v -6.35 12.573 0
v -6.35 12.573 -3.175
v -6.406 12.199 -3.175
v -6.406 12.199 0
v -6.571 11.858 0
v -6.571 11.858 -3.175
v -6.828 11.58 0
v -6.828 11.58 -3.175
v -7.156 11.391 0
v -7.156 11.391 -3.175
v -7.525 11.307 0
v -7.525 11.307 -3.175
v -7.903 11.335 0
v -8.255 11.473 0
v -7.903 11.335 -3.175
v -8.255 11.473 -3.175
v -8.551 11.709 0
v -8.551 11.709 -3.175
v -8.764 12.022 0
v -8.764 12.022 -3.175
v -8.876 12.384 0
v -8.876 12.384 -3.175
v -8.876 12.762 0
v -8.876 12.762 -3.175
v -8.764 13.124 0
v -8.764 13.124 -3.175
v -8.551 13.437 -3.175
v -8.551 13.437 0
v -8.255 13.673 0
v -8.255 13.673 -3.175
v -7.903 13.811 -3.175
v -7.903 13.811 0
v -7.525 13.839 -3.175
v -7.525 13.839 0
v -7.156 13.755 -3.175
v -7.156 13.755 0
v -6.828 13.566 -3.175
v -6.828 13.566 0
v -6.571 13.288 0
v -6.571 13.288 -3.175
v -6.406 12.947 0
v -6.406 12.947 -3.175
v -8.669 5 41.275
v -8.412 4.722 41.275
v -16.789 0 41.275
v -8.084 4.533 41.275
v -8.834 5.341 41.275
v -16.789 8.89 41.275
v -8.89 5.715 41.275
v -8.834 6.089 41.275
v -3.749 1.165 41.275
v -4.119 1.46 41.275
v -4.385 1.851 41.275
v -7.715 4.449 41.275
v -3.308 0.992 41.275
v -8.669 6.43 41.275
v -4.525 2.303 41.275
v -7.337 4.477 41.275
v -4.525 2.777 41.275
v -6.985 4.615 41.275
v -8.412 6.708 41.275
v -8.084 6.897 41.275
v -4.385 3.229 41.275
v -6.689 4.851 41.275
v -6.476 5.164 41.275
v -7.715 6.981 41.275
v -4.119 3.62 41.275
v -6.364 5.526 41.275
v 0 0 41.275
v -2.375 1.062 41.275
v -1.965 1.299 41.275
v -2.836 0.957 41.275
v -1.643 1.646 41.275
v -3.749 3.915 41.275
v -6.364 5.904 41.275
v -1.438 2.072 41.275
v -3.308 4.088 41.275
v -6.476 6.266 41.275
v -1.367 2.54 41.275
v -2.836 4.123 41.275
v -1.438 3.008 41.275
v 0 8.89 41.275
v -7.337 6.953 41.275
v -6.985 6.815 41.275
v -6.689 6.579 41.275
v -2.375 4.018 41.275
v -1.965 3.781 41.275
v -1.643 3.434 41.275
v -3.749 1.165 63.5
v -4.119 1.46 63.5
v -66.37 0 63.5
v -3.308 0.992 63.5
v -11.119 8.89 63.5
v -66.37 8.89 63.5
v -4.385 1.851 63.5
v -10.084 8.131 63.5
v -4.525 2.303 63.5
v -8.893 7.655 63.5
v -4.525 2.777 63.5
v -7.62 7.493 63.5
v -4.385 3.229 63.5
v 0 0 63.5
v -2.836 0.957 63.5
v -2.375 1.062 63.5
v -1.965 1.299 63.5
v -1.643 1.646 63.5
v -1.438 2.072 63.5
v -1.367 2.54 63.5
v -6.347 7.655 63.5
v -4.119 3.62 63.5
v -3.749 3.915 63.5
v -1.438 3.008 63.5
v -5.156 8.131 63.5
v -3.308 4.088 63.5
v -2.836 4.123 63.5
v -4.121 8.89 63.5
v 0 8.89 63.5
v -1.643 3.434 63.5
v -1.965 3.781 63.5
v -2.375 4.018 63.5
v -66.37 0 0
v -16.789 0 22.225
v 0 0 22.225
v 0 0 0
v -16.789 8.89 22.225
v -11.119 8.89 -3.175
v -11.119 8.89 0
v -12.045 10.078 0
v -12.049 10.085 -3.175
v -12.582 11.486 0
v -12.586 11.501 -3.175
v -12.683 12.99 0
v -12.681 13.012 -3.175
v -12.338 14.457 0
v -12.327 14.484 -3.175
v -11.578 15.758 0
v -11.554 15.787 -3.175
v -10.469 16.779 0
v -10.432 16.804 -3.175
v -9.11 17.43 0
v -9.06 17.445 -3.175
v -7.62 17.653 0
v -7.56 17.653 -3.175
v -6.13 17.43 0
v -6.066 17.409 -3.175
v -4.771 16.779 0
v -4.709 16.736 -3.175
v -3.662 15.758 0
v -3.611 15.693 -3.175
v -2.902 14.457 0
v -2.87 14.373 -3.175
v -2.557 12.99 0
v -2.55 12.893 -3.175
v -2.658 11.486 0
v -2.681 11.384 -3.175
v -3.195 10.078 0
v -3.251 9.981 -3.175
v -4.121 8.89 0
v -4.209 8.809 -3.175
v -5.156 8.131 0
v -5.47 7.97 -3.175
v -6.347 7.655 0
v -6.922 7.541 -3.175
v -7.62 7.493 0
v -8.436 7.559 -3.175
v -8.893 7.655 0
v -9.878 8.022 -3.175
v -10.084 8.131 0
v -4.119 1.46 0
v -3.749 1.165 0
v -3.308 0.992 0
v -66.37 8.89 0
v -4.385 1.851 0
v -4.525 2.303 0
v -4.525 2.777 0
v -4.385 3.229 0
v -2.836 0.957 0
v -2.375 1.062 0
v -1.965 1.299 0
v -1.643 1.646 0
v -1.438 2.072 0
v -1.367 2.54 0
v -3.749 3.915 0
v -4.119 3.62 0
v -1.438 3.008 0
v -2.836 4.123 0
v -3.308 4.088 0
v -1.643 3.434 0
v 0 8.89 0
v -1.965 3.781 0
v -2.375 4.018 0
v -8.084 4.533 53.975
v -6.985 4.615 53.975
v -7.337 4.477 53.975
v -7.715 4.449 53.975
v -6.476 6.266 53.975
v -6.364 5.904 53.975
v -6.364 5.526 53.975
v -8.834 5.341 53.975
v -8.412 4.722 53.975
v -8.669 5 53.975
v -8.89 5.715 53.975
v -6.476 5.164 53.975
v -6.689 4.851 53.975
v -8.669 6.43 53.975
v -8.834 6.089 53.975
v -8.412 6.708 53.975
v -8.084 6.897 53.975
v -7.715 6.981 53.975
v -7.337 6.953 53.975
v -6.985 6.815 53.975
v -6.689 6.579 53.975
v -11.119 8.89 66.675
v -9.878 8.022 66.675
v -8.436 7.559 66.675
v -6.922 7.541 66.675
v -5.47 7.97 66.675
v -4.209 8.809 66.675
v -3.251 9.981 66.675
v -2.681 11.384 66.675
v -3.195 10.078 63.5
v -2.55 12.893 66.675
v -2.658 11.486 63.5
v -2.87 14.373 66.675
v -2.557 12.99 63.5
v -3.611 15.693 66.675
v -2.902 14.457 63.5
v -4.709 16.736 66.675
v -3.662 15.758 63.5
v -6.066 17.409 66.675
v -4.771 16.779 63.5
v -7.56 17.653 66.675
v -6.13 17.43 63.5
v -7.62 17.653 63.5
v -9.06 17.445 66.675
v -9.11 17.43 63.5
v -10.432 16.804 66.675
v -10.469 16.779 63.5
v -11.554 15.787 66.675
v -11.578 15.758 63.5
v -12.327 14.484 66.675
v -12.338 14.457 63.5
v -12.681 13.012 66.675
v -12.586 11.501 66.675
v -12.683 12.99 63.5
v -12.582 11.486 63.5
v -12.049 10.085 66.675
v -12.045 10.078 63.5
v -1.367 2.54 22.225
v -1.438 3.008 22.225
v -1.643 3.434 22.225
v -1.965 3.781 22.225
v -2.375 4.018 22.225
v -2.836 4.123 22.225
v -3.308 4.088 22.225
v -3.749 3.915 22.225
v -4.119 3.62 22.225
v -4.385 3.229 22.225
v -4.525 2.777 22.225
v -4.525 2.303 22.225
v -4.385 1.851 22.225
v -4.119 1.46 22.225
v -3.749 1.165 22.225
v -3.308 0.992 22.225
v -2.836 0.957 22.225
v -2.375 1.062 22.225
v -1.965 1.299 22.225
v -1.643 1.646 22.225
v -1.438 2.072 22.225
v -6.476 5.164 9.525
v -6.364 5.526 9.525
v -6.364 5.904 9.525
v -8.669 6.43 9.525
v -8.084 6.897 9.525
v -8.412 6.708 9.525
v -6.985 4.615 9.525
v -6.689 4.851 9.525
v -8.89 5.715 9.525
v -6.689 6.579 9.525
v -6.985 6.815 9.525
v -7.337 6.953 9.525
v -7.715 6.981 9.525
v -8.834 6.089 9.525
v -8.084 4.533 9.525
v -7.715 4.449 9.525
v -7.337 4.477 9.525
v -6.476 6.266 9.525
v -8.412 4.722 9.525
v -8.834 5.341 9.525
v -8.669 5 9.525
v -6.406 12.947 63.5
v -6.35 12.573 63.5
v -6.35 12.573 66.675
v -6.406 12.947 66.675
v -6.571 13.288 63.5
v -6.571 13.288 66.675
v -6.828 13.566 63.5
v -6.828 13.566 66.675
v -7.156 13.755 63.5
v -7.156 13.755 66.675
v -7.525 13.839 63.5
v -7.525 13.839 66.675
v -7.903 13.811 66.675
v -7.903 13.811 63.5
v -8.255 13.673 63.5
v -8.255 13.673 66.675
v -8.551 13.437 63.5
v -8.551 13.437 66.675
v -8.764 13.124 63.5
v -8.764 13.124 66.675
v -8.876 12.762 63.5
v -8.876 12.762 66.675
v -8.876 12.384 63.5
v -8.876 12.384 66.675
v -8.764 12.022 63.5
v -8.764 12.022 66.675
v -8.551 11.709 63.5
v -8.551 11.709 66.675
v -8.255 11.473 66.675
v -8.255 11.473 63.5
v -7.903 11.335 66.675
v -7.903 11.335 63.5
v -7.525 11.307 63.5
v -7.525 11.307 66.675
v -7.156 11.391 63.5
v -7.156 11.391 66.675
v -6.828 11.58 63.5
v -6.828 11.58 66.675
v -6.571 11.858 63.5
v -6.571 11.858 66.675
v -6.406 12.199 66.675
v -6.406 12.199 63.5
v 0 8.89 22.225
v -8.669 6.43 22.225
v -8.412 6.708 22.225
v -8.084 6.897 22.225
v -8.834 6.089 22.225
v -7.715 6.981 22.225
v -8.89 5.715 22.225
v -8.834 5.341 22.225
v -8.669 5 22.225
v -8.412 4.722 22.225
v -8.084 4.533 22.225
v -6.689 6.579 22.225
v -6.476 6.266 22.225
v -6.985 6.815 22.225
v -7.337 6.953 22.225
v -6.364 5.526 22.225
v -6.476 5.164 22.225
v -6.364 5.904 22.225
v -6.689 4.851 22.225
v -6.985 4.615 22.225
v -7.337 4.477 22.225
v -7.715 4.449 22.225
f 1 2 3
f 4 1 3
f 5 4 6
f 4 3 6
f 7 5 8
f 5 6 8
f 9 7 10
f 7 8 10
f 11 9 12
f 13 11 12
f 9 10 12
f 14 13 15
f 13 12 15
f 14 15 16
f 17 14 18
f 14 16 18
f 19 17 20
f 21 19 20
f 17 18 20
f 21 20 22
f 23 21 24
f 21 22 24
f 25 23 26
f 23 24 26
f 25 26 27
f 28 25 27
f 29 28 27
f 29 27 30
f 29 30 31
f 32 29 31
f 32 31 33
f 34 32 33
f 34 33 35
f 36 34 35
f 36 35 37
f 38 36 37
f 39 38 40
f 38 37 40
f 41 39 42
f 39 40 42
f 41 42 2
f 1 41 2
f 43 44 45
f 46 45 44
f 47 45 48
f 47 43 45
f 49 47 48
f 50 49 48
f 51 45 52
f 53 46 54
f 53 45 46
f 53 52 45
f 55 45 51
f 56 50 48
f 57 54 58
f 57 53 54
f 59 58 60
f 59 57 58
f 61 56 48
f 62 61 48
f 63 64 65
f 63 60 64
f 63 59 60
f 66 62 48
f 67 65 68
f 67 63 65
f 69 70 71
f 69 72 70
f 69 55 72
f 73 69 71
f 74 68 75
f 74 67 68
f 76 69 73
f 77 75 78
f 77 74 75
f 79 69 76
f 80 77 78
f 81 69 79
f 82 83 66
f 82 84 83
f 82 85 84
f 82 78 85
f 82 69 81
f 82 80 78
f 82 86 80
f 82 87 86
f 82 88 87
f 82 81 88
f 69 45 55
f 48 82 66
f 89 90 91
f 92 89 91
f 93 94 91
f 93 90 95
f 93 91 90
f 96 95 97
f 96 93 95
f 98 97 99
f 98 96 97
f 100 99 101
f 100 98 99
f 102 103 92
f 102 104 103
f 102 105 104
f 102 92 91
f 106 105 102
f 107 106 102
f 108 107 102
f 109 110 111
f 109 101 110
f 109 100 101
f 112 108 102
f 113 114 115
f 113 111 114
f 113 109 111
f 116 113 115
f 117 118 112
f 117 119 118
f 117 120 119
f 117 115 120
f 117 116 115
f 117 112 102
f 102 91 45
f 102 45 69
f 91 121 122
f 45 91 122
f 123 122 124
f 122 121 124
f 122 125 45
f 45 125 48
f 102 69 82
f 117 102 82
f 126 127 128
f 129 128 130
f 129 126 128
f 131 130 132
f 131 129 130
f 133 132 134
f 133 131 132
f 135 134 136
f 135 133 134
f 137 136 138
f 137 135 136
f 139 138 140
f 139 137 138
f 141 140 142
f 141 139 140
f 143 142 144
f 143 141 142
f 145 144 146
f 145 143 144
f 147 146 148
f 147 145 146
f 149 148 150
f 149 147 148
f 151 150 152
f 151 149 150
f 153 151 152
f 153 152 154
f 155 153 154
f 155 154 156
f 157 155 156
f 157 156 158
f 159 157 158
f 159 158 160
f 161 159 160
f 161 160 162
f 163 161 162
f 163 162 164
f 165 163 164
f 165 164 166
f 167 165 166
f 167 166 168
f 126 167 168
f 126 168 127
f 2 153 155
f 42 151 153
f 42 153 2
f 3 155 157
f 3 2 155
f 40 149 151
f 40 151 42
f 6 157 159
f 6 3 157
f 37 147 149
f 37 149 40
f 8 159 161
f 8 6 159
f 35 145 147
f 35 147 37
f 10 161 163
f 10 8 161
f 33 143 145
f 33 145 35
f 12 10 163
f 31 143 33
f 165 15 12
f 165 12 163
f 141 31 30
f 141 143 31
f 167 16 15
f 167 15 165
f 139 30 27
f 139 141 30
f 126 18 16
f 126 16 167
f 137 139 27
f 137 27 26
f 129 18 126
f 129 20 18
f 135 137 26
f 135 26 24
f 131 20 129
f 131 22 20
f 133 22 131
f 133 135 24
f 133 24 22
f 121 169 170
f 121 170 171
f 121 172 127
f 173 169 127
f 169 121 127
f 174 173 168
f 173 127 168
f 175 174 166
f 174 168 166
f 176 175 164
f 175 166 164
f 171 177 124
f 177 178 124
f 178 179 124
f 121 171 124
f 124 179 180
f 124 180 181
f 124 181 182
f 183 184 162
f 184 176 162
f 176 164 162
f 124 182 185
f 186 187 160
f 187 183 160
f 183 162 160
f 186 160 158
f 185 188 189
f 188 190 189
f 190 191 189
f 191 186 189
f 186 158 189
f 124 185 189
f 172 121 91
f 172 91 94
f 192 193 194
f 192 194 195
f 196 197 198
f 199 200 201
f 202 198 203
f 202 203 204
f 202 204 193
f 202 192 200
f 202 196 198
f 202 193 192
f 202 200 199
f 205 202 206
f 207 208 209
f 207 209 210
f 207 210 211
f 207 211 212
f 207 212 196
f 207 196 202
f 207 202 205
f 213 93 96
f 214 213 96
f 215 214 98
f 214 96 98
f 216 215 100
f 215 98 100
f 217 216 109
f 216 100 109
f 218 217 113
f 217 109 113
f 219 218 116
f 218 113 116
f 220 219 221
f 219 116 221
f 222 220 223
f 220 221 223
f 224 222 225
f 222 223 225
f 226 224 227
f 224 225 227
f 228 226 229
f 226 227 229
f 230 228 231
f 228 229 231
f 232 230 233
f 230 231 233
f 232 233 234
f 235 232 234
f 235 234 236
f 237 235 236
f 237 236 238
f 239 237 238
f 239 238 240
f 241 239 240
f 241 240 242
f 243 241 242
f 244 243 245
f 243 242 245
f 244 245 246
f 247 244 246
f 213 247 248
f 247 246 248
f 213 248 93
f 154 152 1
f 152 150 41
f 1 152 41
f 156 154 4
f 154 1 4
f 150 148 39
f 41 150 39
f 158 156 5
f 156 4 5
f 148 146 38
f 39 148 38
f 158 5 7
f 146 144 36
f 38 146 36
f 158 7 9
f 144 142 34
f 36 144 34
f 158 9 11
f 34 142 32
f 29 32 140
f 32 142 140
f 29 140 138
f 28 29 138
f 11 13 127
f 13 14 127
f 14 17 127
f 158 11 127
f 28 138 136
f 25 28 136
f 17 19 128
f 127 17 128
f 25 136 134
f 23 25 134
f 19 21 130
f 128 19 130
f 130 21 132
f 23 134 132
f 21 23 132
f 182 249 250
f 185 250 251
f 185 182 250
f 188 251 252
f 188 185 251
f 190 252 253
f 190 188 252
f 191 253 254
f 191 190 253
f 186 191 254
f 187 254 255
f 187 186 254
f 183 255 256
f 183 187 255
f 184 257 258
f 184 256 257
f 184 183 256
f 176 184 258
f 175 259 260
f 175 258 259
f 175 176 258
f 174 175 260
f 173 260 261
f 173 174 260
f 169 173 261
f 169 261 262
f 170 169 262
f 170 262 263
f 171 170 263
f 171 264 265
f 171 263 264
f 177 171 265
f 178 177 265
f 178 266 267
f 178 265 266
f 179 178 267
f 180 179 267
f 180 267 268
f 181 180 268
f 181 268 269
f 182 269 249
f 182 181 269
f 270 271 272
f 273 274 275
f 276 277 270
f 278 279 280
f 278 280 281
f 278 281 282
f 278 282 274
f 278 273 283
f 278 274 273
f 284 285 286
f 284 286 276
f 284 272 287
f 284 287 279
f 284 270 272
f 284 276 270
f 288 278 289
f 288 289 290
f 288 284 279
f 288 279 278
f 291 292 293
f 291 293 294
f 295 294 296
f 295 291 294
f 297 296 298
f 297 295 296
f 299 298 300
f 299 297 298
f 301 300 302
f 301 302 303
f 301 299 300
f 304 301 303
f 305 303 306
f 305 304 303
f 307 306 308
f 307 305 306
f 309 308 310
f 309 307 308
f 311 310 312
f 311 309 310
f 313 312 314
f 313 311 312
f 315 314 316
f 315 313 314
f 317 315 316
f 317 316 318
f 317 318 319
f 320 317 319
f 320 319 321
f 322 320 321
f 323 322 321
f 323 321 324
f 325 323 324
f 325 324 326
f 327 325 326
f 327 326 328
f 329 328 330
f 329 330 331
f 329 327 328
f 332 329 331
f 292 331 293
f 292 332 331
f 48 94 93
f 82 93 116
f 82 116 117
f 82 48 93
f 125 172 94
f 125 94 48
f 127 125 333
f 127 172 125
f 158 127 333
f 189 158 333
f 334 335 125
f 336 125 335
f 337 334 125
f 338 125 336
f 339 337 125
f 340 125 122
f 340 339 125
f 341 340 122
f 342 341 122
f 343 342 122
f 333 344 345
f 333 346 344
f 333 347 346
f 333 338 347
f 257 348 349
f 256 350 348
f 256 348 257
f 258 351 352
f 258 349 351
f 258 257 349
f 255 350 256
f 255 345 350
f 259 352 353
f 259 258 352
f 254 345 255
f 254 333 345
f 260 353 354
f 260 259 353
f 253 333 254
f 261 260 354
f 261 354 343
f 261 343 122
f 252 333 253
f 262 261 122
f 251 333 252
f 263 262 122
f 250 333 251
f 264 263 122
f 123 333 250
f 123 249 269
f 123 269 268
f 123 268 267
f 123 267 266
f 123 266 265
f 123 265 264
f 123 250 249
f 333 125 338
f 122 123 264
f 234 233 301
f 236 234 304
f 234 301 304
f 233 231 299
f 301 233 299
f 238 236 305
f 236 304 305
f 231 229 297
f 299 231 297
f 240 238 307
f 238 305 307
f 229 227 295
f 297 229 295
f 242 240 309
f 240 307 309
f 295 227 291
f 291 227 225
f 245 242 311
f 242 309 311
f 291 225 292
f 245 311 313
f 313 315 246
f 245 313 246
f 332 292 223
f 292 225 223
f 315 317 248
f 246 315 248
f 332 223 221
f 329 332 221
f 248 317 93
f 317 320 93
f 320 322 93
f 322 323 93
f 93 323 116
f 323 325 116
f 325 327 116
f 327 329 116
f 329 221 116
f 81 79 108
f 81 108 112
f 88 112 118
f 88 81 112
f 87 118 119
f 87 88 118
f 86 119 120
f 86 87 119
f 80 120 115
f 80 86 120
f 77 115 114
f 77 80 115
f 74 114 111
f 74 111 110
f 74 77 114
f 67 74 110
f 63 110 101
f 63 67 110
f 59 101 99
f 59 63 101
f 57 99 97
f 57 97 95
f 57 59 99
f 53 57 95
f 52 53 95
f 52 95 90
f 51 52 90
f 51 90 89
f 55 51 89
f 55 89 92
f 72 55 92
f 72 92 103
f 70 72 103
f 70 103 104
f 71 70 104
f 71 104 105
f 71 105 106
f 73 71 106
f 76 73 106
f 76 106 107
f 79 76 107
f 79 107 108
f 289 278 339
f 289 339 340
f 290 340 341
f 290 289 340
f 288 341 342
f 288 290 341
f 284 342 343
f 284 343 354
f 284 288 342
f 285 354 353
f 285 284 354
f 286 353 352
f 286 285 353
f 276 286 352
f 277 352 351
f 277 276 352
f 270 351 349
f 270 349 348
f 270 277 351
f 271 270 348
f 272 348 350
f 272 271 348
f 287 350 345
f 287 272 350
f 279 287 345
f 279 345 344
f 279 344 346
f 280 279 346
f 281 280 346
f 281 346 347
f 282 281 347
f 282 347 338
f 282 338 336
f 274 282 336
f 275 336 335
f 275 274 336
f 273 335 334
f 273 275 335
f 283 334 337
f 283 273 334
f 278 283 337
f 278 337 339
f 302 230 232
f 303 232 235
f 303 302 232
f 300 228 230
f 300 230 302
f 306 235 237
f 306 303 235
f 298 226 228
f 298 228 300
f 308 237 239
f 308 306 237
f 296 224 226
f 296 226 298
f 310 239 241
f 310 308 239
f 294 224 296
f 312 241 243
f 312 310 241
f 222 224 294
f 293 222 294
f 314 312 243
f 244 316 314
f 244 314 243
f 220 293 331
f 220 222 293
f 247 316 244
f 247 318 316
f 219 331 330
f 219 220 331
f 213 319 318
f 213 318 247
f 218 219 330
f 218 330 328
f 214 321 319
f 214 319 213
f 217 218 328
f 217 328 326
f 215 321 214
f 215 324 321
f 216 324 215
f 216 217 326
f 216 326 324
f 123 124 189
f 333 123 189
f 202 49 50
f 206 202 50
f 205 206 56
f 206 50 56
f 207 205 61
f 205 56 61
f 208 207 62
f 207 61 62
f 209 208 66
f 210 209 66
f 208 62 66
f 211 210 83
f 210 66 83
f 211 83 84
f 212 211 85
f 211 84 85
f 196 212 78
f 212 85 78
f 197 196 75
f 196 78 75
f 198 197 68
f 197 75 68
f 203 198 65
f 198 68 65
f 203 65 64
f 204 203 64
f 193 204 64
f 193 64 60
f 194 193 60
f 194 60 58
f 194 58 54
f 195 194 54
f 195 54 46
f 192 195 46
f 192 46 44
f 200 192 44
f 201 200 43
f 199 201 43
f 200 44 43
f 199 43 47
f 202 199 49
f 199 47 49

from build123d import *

# Parameters (mm, degrees)
SKETCH1_W           = 66.3702
SKETCH1_H           = 8.89
SKETCH1_R           = 1.5875
BOSS_EXTRUDE2_DEPTH = 63.5
CUT_EXTRUDE1_DEPTH  = 16.7894
SKETCH3_R           = 1.27
CUT_EXTRUDE2_DEPTH  = 12.7
CUT_EXTRUDE3_START  = -12.7
SKETCH4_R           = 1.27
CUT_EXTRUDE3_DEPTH  = 12.7
SKETCH5_R           = 5.08
SKETCH5_R_2         = 1.27
BOSS_EXTRUDE3_DEPTH = 3.175
BOSS_EXTRUDE4_START = 3.175
SKETCH6_R           = 5.08
SKETCH6_R_2         = 1.27
BOSS_EXTRUDE4_DEPTH = 3.175


with BuildPart() as part:
    # Sketch1 → Boss-Extrude2 (new body)
    with BuildSketch(Plane.XY):
        with Locations((-33.1851, 4.445)):
            Rectangle(SKETCH1_W, SKETCH1_H)
        with Locations((-2.954856457, 2.54)):
            Circle(SKETCH1_R, mode=Mode.SUBTRACT)
    extrude(amount=BOSS_EXTRUDE2_DEPTH)

    # Sketch2 → Cut-Extrude1 (cut)
    with BuildSketch(Plane(origin=(0, 0, 0), x_dir=(0, 0, -1), z_dir=(1, 0, 0))):
        Polygon((-31.75, 8.89), (-22.225, 8.89), (-22.225, 0), (-41.275, 0), (-41.275, 8.89), align=None)
    extrude(amount=-CUT_EXTRUDE1_DEPTH, mode=Mode.SUBTRACT)

    # Sketch3 → Cut-Extrude2 (cut)
    with BuildSketch(Plane(origin=(0, 0, 41.275), x_dir=(-1, 0, 0), z_dir=(0, 0, -1))):
        with Locations((7.62, 5.715)):
            Circle(SKETCH3_R)
    extrude(amount=-CUT_EXTRUDE2_DEPTH, mode=Mode.SUBTRACT)

    # Sketch4 → Cut-Extrude3 (cut)
    with BuildSketch(Plane.XY.offset(22.225).offset(CUT_EXTRUDE3_START)):
        with Locations(Location((-7.62, 5.715, 0), (0, 0, 180))):
            Circle(SKETCH4_R)
    extrude(amount=CUT_EXTRUDE3_DEPTH, mode=Mode.SUBTRACT)

    # Sketch5 → Boss-Extrude3 (add)
    with BuildSketch(Plane.XY.offset(63.5)):
        with Locations(Location((-7.62, 12.573, 0), (0, 0, 226.468847833))):
            Circle(SKETCH5_R)
        with Locations((-7.62, 12.573)):
            Circle(SKETCH5_R_2, mode=Mode.SUBTRACT)
    extrude(amount=BOSS_EXTRUDE3_DEPTH)

    # Sketch6 → Boss-Extrude4 (add)
    with BuildSketch(Plane(origin=(0, 0, 0), x_dir=(-1, 0, 0), z_dir=(0, 0, -1)).offset(BOSS_EXTRUDE4_START)):
        with Locations(Location((7.62, 12.573, 0), (0, 0, 313.531152167))):
            Circle(SKETCH6_R)
        with Locations(Location((7.62, 12.573, 0), (0, 0, 180))):
            Circle(SKETCH6_R_2, mode=Mode.SUBTRACT)
    extrude(amount=-BOSS_EXTRUDE4_DEPTH)


solid = part.part
